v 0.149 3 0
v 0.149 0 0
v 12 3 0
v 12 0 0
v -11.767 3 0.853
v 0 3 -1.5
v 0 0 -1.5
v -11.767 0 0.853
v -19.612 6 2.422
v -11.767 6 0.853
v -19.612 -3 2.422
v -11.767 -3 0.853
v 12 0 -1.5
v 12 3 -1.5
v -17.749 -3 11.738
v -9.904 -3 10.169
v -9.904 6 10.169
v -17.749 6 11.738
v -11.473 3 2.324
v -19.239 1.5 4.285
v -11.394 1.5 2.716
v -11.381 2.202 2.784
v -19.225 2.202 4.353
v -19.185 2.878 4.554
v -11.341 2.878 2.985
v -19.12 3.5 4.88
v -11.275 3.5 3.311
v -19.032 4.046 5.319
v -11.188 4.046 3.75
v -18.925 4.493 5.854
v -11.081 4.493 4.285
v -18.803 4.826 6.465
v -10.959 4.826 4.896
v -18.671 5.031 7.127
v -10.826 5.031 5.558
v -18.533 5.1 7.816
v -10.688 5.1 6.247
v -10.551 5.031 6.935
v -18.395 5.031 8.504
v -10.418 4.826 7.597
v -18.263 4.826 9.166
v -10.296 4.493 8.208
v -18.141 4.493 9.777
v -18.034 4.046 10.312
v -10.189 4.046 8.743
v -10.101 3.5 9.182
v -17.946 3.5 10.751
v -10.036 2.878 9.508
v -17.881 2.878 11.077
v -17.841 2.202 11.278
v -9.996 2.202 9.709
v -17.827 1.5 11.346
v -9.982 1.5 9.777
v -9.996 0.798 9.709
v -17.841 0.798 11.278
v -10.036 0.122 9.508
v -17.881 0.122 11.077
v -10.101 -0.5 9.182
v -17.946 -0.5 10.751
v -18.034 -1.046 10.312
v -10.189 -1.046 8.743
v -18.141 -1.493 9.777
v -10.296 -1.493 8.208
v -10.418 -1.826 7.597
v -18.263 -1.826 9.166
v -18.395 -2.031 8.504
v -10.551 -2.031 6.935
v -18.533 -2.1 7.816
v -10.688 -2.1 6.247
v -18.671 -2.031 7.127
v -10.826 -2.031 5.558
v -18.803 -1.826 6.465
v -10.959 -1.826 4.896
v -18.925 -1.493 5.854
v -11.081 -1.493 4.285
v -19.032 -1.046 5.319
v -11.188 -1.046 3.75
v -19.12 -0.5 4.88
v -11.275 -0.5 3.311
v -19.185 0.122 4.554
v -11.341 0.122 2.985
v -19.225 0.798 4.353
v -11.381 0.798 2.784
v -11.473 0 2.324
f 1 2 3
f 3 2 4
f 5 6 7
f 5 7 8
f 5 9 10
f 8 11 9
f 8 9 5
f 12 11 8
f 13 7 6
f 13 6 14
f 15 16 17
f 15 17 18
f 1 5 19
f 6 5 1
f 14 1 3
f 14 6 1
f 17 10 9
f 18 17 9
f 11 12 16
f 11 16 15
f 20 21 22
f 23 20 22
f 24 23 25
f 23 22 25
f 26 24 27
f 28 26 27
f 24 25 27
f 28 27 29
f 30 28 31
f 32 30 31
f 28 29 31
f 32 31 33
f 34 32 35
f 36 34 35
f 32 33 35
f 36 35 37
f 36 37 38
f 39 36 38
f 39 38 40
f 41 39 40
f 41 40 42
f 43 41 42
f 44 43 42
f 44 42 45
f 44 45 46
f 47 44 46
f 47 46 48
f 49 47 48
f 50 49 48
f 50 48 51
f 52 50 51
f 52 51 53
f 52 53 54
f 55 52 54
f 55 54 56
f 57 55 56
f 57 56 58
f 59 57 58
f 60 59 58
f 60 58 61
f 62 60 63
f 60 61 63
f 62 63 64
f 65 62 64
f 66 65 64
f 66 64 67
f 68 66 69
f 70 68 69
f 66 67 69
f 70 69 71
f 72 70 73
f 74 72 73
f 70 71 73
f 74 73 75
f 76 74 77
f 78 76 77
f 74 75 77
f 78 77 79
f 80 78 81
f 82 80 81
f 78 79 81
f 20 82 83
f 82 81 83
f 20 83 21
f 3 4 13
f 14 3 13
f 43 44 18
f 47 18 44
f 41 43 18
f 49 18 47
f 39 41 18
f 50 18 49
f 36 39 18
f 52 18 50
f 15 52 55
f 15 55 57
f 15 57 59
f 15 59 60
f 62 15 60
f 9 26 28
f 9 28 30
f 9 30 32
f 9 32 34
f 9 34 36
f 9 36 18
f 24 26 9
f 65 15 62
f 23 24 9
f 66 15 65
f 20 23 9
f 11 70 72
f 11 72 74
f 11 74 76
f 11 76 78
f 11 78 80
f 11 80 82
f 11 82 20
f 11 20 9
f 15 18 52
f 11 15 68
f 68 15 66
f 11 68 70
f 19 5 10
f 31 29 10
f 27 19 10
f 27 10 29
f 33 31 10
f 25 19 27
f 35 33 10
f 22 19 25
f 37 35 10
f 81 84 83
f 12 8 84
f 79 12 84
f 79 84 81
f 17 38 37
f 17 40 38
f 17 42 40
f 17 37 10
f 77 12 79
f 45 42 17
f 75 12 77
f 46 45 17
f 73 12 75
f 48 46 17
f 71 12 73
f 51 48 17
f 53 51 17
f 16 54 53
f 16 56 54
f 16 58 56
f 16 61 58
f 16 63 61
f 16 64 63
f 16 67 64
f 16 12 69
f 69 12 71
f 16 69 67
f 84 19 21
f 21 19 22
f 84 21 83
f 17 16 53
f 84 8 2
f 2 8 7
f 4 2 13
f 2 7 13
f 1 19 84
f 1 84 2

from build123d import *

# Parameters (mm, degrees)
SKETCH1_W                        = 12
SKETCH1_H                        = 1.5
BOSS_EXTRUDE1_DEPTH              = 3
BOSS_EXTRUDE2_DEPTH              = 3
BOSS_EXTRUDE3_DEPTH              = 3
BOSS_EXTRUDE3_DEPTH_BACK         = 6
F_97_0_0059_DIAMETER_HOLE1_D     = 7.200000078
F_97_0_0059_DIAMETER_HOLE1_DEPTH = 10


with BuildPart() as part:
    # Sketch1 → Boss-Extrude1 (new body)
    with BuildSketch(Plane(origin=(0, 0, 0), x_dir=(1, 0, 0), z_dir=(0, 1, 0))):
        with Locations((6, 0.75)):
            Rectangle(SKETCH1_W, SKETCH1_H)
    extrude(amount=BOSS_EXTRUDE1_DEPTH)

    # Sketch2 → Boss-Extrude2 (add)
    with BuildSketch(Plane(origin=(0, 3, 0), x_dir=(1, 0, 0), z_dir=(0, 1, 0))):
        Polygon((0, 1.5), (-11.766968108, -0.853393621), (-11.472793906, -2.324264634), (0.294174203, 0.029128986), align=None)
    extrude(amount=-BOSS_EXTRUDE2_DEPTH)

    # Sketch4 → Boss-Extrude3 (add, two sides: drawn at the far end of the back side and taken through both)
    with BuildSketch(Plane(origin=(0, 3, 0), x_dir=(1, 0, 0), z_dir=(0, 1, 0)).offset(-BOSS_EXTRUDE3_DEPTH_BACK)):
        Polygon((-11.766968108, -0.853393621), (-9.903864825, -10.16891004), (-17.748510231, -11.737839121), (-19.611613514, -2.422322701), align=None)
    extrude(amount=BOSS_EXTRUDE3_DEPTH + BOSS_EXTRUDE3_DEPTH_BACK)

    # #97 (0.0059) Diameter Hole1
    with Locations(Plane(origin=(-19.323151976, 0, 3.864630394), x_dir=(0.19611613506937434, 0, 0.9805806757046821), z_dir=(-0.9805806757046821, 0, 0.19611613506937434))):
        with Locations((4.029128986, 1.5)):
            Hole(F_97_0_0059_DIAMETER_HOLE1_D / 2, depth=F_97_0_0059_DIAMETER_HOLE1_DEPTH)


solid = part.part
